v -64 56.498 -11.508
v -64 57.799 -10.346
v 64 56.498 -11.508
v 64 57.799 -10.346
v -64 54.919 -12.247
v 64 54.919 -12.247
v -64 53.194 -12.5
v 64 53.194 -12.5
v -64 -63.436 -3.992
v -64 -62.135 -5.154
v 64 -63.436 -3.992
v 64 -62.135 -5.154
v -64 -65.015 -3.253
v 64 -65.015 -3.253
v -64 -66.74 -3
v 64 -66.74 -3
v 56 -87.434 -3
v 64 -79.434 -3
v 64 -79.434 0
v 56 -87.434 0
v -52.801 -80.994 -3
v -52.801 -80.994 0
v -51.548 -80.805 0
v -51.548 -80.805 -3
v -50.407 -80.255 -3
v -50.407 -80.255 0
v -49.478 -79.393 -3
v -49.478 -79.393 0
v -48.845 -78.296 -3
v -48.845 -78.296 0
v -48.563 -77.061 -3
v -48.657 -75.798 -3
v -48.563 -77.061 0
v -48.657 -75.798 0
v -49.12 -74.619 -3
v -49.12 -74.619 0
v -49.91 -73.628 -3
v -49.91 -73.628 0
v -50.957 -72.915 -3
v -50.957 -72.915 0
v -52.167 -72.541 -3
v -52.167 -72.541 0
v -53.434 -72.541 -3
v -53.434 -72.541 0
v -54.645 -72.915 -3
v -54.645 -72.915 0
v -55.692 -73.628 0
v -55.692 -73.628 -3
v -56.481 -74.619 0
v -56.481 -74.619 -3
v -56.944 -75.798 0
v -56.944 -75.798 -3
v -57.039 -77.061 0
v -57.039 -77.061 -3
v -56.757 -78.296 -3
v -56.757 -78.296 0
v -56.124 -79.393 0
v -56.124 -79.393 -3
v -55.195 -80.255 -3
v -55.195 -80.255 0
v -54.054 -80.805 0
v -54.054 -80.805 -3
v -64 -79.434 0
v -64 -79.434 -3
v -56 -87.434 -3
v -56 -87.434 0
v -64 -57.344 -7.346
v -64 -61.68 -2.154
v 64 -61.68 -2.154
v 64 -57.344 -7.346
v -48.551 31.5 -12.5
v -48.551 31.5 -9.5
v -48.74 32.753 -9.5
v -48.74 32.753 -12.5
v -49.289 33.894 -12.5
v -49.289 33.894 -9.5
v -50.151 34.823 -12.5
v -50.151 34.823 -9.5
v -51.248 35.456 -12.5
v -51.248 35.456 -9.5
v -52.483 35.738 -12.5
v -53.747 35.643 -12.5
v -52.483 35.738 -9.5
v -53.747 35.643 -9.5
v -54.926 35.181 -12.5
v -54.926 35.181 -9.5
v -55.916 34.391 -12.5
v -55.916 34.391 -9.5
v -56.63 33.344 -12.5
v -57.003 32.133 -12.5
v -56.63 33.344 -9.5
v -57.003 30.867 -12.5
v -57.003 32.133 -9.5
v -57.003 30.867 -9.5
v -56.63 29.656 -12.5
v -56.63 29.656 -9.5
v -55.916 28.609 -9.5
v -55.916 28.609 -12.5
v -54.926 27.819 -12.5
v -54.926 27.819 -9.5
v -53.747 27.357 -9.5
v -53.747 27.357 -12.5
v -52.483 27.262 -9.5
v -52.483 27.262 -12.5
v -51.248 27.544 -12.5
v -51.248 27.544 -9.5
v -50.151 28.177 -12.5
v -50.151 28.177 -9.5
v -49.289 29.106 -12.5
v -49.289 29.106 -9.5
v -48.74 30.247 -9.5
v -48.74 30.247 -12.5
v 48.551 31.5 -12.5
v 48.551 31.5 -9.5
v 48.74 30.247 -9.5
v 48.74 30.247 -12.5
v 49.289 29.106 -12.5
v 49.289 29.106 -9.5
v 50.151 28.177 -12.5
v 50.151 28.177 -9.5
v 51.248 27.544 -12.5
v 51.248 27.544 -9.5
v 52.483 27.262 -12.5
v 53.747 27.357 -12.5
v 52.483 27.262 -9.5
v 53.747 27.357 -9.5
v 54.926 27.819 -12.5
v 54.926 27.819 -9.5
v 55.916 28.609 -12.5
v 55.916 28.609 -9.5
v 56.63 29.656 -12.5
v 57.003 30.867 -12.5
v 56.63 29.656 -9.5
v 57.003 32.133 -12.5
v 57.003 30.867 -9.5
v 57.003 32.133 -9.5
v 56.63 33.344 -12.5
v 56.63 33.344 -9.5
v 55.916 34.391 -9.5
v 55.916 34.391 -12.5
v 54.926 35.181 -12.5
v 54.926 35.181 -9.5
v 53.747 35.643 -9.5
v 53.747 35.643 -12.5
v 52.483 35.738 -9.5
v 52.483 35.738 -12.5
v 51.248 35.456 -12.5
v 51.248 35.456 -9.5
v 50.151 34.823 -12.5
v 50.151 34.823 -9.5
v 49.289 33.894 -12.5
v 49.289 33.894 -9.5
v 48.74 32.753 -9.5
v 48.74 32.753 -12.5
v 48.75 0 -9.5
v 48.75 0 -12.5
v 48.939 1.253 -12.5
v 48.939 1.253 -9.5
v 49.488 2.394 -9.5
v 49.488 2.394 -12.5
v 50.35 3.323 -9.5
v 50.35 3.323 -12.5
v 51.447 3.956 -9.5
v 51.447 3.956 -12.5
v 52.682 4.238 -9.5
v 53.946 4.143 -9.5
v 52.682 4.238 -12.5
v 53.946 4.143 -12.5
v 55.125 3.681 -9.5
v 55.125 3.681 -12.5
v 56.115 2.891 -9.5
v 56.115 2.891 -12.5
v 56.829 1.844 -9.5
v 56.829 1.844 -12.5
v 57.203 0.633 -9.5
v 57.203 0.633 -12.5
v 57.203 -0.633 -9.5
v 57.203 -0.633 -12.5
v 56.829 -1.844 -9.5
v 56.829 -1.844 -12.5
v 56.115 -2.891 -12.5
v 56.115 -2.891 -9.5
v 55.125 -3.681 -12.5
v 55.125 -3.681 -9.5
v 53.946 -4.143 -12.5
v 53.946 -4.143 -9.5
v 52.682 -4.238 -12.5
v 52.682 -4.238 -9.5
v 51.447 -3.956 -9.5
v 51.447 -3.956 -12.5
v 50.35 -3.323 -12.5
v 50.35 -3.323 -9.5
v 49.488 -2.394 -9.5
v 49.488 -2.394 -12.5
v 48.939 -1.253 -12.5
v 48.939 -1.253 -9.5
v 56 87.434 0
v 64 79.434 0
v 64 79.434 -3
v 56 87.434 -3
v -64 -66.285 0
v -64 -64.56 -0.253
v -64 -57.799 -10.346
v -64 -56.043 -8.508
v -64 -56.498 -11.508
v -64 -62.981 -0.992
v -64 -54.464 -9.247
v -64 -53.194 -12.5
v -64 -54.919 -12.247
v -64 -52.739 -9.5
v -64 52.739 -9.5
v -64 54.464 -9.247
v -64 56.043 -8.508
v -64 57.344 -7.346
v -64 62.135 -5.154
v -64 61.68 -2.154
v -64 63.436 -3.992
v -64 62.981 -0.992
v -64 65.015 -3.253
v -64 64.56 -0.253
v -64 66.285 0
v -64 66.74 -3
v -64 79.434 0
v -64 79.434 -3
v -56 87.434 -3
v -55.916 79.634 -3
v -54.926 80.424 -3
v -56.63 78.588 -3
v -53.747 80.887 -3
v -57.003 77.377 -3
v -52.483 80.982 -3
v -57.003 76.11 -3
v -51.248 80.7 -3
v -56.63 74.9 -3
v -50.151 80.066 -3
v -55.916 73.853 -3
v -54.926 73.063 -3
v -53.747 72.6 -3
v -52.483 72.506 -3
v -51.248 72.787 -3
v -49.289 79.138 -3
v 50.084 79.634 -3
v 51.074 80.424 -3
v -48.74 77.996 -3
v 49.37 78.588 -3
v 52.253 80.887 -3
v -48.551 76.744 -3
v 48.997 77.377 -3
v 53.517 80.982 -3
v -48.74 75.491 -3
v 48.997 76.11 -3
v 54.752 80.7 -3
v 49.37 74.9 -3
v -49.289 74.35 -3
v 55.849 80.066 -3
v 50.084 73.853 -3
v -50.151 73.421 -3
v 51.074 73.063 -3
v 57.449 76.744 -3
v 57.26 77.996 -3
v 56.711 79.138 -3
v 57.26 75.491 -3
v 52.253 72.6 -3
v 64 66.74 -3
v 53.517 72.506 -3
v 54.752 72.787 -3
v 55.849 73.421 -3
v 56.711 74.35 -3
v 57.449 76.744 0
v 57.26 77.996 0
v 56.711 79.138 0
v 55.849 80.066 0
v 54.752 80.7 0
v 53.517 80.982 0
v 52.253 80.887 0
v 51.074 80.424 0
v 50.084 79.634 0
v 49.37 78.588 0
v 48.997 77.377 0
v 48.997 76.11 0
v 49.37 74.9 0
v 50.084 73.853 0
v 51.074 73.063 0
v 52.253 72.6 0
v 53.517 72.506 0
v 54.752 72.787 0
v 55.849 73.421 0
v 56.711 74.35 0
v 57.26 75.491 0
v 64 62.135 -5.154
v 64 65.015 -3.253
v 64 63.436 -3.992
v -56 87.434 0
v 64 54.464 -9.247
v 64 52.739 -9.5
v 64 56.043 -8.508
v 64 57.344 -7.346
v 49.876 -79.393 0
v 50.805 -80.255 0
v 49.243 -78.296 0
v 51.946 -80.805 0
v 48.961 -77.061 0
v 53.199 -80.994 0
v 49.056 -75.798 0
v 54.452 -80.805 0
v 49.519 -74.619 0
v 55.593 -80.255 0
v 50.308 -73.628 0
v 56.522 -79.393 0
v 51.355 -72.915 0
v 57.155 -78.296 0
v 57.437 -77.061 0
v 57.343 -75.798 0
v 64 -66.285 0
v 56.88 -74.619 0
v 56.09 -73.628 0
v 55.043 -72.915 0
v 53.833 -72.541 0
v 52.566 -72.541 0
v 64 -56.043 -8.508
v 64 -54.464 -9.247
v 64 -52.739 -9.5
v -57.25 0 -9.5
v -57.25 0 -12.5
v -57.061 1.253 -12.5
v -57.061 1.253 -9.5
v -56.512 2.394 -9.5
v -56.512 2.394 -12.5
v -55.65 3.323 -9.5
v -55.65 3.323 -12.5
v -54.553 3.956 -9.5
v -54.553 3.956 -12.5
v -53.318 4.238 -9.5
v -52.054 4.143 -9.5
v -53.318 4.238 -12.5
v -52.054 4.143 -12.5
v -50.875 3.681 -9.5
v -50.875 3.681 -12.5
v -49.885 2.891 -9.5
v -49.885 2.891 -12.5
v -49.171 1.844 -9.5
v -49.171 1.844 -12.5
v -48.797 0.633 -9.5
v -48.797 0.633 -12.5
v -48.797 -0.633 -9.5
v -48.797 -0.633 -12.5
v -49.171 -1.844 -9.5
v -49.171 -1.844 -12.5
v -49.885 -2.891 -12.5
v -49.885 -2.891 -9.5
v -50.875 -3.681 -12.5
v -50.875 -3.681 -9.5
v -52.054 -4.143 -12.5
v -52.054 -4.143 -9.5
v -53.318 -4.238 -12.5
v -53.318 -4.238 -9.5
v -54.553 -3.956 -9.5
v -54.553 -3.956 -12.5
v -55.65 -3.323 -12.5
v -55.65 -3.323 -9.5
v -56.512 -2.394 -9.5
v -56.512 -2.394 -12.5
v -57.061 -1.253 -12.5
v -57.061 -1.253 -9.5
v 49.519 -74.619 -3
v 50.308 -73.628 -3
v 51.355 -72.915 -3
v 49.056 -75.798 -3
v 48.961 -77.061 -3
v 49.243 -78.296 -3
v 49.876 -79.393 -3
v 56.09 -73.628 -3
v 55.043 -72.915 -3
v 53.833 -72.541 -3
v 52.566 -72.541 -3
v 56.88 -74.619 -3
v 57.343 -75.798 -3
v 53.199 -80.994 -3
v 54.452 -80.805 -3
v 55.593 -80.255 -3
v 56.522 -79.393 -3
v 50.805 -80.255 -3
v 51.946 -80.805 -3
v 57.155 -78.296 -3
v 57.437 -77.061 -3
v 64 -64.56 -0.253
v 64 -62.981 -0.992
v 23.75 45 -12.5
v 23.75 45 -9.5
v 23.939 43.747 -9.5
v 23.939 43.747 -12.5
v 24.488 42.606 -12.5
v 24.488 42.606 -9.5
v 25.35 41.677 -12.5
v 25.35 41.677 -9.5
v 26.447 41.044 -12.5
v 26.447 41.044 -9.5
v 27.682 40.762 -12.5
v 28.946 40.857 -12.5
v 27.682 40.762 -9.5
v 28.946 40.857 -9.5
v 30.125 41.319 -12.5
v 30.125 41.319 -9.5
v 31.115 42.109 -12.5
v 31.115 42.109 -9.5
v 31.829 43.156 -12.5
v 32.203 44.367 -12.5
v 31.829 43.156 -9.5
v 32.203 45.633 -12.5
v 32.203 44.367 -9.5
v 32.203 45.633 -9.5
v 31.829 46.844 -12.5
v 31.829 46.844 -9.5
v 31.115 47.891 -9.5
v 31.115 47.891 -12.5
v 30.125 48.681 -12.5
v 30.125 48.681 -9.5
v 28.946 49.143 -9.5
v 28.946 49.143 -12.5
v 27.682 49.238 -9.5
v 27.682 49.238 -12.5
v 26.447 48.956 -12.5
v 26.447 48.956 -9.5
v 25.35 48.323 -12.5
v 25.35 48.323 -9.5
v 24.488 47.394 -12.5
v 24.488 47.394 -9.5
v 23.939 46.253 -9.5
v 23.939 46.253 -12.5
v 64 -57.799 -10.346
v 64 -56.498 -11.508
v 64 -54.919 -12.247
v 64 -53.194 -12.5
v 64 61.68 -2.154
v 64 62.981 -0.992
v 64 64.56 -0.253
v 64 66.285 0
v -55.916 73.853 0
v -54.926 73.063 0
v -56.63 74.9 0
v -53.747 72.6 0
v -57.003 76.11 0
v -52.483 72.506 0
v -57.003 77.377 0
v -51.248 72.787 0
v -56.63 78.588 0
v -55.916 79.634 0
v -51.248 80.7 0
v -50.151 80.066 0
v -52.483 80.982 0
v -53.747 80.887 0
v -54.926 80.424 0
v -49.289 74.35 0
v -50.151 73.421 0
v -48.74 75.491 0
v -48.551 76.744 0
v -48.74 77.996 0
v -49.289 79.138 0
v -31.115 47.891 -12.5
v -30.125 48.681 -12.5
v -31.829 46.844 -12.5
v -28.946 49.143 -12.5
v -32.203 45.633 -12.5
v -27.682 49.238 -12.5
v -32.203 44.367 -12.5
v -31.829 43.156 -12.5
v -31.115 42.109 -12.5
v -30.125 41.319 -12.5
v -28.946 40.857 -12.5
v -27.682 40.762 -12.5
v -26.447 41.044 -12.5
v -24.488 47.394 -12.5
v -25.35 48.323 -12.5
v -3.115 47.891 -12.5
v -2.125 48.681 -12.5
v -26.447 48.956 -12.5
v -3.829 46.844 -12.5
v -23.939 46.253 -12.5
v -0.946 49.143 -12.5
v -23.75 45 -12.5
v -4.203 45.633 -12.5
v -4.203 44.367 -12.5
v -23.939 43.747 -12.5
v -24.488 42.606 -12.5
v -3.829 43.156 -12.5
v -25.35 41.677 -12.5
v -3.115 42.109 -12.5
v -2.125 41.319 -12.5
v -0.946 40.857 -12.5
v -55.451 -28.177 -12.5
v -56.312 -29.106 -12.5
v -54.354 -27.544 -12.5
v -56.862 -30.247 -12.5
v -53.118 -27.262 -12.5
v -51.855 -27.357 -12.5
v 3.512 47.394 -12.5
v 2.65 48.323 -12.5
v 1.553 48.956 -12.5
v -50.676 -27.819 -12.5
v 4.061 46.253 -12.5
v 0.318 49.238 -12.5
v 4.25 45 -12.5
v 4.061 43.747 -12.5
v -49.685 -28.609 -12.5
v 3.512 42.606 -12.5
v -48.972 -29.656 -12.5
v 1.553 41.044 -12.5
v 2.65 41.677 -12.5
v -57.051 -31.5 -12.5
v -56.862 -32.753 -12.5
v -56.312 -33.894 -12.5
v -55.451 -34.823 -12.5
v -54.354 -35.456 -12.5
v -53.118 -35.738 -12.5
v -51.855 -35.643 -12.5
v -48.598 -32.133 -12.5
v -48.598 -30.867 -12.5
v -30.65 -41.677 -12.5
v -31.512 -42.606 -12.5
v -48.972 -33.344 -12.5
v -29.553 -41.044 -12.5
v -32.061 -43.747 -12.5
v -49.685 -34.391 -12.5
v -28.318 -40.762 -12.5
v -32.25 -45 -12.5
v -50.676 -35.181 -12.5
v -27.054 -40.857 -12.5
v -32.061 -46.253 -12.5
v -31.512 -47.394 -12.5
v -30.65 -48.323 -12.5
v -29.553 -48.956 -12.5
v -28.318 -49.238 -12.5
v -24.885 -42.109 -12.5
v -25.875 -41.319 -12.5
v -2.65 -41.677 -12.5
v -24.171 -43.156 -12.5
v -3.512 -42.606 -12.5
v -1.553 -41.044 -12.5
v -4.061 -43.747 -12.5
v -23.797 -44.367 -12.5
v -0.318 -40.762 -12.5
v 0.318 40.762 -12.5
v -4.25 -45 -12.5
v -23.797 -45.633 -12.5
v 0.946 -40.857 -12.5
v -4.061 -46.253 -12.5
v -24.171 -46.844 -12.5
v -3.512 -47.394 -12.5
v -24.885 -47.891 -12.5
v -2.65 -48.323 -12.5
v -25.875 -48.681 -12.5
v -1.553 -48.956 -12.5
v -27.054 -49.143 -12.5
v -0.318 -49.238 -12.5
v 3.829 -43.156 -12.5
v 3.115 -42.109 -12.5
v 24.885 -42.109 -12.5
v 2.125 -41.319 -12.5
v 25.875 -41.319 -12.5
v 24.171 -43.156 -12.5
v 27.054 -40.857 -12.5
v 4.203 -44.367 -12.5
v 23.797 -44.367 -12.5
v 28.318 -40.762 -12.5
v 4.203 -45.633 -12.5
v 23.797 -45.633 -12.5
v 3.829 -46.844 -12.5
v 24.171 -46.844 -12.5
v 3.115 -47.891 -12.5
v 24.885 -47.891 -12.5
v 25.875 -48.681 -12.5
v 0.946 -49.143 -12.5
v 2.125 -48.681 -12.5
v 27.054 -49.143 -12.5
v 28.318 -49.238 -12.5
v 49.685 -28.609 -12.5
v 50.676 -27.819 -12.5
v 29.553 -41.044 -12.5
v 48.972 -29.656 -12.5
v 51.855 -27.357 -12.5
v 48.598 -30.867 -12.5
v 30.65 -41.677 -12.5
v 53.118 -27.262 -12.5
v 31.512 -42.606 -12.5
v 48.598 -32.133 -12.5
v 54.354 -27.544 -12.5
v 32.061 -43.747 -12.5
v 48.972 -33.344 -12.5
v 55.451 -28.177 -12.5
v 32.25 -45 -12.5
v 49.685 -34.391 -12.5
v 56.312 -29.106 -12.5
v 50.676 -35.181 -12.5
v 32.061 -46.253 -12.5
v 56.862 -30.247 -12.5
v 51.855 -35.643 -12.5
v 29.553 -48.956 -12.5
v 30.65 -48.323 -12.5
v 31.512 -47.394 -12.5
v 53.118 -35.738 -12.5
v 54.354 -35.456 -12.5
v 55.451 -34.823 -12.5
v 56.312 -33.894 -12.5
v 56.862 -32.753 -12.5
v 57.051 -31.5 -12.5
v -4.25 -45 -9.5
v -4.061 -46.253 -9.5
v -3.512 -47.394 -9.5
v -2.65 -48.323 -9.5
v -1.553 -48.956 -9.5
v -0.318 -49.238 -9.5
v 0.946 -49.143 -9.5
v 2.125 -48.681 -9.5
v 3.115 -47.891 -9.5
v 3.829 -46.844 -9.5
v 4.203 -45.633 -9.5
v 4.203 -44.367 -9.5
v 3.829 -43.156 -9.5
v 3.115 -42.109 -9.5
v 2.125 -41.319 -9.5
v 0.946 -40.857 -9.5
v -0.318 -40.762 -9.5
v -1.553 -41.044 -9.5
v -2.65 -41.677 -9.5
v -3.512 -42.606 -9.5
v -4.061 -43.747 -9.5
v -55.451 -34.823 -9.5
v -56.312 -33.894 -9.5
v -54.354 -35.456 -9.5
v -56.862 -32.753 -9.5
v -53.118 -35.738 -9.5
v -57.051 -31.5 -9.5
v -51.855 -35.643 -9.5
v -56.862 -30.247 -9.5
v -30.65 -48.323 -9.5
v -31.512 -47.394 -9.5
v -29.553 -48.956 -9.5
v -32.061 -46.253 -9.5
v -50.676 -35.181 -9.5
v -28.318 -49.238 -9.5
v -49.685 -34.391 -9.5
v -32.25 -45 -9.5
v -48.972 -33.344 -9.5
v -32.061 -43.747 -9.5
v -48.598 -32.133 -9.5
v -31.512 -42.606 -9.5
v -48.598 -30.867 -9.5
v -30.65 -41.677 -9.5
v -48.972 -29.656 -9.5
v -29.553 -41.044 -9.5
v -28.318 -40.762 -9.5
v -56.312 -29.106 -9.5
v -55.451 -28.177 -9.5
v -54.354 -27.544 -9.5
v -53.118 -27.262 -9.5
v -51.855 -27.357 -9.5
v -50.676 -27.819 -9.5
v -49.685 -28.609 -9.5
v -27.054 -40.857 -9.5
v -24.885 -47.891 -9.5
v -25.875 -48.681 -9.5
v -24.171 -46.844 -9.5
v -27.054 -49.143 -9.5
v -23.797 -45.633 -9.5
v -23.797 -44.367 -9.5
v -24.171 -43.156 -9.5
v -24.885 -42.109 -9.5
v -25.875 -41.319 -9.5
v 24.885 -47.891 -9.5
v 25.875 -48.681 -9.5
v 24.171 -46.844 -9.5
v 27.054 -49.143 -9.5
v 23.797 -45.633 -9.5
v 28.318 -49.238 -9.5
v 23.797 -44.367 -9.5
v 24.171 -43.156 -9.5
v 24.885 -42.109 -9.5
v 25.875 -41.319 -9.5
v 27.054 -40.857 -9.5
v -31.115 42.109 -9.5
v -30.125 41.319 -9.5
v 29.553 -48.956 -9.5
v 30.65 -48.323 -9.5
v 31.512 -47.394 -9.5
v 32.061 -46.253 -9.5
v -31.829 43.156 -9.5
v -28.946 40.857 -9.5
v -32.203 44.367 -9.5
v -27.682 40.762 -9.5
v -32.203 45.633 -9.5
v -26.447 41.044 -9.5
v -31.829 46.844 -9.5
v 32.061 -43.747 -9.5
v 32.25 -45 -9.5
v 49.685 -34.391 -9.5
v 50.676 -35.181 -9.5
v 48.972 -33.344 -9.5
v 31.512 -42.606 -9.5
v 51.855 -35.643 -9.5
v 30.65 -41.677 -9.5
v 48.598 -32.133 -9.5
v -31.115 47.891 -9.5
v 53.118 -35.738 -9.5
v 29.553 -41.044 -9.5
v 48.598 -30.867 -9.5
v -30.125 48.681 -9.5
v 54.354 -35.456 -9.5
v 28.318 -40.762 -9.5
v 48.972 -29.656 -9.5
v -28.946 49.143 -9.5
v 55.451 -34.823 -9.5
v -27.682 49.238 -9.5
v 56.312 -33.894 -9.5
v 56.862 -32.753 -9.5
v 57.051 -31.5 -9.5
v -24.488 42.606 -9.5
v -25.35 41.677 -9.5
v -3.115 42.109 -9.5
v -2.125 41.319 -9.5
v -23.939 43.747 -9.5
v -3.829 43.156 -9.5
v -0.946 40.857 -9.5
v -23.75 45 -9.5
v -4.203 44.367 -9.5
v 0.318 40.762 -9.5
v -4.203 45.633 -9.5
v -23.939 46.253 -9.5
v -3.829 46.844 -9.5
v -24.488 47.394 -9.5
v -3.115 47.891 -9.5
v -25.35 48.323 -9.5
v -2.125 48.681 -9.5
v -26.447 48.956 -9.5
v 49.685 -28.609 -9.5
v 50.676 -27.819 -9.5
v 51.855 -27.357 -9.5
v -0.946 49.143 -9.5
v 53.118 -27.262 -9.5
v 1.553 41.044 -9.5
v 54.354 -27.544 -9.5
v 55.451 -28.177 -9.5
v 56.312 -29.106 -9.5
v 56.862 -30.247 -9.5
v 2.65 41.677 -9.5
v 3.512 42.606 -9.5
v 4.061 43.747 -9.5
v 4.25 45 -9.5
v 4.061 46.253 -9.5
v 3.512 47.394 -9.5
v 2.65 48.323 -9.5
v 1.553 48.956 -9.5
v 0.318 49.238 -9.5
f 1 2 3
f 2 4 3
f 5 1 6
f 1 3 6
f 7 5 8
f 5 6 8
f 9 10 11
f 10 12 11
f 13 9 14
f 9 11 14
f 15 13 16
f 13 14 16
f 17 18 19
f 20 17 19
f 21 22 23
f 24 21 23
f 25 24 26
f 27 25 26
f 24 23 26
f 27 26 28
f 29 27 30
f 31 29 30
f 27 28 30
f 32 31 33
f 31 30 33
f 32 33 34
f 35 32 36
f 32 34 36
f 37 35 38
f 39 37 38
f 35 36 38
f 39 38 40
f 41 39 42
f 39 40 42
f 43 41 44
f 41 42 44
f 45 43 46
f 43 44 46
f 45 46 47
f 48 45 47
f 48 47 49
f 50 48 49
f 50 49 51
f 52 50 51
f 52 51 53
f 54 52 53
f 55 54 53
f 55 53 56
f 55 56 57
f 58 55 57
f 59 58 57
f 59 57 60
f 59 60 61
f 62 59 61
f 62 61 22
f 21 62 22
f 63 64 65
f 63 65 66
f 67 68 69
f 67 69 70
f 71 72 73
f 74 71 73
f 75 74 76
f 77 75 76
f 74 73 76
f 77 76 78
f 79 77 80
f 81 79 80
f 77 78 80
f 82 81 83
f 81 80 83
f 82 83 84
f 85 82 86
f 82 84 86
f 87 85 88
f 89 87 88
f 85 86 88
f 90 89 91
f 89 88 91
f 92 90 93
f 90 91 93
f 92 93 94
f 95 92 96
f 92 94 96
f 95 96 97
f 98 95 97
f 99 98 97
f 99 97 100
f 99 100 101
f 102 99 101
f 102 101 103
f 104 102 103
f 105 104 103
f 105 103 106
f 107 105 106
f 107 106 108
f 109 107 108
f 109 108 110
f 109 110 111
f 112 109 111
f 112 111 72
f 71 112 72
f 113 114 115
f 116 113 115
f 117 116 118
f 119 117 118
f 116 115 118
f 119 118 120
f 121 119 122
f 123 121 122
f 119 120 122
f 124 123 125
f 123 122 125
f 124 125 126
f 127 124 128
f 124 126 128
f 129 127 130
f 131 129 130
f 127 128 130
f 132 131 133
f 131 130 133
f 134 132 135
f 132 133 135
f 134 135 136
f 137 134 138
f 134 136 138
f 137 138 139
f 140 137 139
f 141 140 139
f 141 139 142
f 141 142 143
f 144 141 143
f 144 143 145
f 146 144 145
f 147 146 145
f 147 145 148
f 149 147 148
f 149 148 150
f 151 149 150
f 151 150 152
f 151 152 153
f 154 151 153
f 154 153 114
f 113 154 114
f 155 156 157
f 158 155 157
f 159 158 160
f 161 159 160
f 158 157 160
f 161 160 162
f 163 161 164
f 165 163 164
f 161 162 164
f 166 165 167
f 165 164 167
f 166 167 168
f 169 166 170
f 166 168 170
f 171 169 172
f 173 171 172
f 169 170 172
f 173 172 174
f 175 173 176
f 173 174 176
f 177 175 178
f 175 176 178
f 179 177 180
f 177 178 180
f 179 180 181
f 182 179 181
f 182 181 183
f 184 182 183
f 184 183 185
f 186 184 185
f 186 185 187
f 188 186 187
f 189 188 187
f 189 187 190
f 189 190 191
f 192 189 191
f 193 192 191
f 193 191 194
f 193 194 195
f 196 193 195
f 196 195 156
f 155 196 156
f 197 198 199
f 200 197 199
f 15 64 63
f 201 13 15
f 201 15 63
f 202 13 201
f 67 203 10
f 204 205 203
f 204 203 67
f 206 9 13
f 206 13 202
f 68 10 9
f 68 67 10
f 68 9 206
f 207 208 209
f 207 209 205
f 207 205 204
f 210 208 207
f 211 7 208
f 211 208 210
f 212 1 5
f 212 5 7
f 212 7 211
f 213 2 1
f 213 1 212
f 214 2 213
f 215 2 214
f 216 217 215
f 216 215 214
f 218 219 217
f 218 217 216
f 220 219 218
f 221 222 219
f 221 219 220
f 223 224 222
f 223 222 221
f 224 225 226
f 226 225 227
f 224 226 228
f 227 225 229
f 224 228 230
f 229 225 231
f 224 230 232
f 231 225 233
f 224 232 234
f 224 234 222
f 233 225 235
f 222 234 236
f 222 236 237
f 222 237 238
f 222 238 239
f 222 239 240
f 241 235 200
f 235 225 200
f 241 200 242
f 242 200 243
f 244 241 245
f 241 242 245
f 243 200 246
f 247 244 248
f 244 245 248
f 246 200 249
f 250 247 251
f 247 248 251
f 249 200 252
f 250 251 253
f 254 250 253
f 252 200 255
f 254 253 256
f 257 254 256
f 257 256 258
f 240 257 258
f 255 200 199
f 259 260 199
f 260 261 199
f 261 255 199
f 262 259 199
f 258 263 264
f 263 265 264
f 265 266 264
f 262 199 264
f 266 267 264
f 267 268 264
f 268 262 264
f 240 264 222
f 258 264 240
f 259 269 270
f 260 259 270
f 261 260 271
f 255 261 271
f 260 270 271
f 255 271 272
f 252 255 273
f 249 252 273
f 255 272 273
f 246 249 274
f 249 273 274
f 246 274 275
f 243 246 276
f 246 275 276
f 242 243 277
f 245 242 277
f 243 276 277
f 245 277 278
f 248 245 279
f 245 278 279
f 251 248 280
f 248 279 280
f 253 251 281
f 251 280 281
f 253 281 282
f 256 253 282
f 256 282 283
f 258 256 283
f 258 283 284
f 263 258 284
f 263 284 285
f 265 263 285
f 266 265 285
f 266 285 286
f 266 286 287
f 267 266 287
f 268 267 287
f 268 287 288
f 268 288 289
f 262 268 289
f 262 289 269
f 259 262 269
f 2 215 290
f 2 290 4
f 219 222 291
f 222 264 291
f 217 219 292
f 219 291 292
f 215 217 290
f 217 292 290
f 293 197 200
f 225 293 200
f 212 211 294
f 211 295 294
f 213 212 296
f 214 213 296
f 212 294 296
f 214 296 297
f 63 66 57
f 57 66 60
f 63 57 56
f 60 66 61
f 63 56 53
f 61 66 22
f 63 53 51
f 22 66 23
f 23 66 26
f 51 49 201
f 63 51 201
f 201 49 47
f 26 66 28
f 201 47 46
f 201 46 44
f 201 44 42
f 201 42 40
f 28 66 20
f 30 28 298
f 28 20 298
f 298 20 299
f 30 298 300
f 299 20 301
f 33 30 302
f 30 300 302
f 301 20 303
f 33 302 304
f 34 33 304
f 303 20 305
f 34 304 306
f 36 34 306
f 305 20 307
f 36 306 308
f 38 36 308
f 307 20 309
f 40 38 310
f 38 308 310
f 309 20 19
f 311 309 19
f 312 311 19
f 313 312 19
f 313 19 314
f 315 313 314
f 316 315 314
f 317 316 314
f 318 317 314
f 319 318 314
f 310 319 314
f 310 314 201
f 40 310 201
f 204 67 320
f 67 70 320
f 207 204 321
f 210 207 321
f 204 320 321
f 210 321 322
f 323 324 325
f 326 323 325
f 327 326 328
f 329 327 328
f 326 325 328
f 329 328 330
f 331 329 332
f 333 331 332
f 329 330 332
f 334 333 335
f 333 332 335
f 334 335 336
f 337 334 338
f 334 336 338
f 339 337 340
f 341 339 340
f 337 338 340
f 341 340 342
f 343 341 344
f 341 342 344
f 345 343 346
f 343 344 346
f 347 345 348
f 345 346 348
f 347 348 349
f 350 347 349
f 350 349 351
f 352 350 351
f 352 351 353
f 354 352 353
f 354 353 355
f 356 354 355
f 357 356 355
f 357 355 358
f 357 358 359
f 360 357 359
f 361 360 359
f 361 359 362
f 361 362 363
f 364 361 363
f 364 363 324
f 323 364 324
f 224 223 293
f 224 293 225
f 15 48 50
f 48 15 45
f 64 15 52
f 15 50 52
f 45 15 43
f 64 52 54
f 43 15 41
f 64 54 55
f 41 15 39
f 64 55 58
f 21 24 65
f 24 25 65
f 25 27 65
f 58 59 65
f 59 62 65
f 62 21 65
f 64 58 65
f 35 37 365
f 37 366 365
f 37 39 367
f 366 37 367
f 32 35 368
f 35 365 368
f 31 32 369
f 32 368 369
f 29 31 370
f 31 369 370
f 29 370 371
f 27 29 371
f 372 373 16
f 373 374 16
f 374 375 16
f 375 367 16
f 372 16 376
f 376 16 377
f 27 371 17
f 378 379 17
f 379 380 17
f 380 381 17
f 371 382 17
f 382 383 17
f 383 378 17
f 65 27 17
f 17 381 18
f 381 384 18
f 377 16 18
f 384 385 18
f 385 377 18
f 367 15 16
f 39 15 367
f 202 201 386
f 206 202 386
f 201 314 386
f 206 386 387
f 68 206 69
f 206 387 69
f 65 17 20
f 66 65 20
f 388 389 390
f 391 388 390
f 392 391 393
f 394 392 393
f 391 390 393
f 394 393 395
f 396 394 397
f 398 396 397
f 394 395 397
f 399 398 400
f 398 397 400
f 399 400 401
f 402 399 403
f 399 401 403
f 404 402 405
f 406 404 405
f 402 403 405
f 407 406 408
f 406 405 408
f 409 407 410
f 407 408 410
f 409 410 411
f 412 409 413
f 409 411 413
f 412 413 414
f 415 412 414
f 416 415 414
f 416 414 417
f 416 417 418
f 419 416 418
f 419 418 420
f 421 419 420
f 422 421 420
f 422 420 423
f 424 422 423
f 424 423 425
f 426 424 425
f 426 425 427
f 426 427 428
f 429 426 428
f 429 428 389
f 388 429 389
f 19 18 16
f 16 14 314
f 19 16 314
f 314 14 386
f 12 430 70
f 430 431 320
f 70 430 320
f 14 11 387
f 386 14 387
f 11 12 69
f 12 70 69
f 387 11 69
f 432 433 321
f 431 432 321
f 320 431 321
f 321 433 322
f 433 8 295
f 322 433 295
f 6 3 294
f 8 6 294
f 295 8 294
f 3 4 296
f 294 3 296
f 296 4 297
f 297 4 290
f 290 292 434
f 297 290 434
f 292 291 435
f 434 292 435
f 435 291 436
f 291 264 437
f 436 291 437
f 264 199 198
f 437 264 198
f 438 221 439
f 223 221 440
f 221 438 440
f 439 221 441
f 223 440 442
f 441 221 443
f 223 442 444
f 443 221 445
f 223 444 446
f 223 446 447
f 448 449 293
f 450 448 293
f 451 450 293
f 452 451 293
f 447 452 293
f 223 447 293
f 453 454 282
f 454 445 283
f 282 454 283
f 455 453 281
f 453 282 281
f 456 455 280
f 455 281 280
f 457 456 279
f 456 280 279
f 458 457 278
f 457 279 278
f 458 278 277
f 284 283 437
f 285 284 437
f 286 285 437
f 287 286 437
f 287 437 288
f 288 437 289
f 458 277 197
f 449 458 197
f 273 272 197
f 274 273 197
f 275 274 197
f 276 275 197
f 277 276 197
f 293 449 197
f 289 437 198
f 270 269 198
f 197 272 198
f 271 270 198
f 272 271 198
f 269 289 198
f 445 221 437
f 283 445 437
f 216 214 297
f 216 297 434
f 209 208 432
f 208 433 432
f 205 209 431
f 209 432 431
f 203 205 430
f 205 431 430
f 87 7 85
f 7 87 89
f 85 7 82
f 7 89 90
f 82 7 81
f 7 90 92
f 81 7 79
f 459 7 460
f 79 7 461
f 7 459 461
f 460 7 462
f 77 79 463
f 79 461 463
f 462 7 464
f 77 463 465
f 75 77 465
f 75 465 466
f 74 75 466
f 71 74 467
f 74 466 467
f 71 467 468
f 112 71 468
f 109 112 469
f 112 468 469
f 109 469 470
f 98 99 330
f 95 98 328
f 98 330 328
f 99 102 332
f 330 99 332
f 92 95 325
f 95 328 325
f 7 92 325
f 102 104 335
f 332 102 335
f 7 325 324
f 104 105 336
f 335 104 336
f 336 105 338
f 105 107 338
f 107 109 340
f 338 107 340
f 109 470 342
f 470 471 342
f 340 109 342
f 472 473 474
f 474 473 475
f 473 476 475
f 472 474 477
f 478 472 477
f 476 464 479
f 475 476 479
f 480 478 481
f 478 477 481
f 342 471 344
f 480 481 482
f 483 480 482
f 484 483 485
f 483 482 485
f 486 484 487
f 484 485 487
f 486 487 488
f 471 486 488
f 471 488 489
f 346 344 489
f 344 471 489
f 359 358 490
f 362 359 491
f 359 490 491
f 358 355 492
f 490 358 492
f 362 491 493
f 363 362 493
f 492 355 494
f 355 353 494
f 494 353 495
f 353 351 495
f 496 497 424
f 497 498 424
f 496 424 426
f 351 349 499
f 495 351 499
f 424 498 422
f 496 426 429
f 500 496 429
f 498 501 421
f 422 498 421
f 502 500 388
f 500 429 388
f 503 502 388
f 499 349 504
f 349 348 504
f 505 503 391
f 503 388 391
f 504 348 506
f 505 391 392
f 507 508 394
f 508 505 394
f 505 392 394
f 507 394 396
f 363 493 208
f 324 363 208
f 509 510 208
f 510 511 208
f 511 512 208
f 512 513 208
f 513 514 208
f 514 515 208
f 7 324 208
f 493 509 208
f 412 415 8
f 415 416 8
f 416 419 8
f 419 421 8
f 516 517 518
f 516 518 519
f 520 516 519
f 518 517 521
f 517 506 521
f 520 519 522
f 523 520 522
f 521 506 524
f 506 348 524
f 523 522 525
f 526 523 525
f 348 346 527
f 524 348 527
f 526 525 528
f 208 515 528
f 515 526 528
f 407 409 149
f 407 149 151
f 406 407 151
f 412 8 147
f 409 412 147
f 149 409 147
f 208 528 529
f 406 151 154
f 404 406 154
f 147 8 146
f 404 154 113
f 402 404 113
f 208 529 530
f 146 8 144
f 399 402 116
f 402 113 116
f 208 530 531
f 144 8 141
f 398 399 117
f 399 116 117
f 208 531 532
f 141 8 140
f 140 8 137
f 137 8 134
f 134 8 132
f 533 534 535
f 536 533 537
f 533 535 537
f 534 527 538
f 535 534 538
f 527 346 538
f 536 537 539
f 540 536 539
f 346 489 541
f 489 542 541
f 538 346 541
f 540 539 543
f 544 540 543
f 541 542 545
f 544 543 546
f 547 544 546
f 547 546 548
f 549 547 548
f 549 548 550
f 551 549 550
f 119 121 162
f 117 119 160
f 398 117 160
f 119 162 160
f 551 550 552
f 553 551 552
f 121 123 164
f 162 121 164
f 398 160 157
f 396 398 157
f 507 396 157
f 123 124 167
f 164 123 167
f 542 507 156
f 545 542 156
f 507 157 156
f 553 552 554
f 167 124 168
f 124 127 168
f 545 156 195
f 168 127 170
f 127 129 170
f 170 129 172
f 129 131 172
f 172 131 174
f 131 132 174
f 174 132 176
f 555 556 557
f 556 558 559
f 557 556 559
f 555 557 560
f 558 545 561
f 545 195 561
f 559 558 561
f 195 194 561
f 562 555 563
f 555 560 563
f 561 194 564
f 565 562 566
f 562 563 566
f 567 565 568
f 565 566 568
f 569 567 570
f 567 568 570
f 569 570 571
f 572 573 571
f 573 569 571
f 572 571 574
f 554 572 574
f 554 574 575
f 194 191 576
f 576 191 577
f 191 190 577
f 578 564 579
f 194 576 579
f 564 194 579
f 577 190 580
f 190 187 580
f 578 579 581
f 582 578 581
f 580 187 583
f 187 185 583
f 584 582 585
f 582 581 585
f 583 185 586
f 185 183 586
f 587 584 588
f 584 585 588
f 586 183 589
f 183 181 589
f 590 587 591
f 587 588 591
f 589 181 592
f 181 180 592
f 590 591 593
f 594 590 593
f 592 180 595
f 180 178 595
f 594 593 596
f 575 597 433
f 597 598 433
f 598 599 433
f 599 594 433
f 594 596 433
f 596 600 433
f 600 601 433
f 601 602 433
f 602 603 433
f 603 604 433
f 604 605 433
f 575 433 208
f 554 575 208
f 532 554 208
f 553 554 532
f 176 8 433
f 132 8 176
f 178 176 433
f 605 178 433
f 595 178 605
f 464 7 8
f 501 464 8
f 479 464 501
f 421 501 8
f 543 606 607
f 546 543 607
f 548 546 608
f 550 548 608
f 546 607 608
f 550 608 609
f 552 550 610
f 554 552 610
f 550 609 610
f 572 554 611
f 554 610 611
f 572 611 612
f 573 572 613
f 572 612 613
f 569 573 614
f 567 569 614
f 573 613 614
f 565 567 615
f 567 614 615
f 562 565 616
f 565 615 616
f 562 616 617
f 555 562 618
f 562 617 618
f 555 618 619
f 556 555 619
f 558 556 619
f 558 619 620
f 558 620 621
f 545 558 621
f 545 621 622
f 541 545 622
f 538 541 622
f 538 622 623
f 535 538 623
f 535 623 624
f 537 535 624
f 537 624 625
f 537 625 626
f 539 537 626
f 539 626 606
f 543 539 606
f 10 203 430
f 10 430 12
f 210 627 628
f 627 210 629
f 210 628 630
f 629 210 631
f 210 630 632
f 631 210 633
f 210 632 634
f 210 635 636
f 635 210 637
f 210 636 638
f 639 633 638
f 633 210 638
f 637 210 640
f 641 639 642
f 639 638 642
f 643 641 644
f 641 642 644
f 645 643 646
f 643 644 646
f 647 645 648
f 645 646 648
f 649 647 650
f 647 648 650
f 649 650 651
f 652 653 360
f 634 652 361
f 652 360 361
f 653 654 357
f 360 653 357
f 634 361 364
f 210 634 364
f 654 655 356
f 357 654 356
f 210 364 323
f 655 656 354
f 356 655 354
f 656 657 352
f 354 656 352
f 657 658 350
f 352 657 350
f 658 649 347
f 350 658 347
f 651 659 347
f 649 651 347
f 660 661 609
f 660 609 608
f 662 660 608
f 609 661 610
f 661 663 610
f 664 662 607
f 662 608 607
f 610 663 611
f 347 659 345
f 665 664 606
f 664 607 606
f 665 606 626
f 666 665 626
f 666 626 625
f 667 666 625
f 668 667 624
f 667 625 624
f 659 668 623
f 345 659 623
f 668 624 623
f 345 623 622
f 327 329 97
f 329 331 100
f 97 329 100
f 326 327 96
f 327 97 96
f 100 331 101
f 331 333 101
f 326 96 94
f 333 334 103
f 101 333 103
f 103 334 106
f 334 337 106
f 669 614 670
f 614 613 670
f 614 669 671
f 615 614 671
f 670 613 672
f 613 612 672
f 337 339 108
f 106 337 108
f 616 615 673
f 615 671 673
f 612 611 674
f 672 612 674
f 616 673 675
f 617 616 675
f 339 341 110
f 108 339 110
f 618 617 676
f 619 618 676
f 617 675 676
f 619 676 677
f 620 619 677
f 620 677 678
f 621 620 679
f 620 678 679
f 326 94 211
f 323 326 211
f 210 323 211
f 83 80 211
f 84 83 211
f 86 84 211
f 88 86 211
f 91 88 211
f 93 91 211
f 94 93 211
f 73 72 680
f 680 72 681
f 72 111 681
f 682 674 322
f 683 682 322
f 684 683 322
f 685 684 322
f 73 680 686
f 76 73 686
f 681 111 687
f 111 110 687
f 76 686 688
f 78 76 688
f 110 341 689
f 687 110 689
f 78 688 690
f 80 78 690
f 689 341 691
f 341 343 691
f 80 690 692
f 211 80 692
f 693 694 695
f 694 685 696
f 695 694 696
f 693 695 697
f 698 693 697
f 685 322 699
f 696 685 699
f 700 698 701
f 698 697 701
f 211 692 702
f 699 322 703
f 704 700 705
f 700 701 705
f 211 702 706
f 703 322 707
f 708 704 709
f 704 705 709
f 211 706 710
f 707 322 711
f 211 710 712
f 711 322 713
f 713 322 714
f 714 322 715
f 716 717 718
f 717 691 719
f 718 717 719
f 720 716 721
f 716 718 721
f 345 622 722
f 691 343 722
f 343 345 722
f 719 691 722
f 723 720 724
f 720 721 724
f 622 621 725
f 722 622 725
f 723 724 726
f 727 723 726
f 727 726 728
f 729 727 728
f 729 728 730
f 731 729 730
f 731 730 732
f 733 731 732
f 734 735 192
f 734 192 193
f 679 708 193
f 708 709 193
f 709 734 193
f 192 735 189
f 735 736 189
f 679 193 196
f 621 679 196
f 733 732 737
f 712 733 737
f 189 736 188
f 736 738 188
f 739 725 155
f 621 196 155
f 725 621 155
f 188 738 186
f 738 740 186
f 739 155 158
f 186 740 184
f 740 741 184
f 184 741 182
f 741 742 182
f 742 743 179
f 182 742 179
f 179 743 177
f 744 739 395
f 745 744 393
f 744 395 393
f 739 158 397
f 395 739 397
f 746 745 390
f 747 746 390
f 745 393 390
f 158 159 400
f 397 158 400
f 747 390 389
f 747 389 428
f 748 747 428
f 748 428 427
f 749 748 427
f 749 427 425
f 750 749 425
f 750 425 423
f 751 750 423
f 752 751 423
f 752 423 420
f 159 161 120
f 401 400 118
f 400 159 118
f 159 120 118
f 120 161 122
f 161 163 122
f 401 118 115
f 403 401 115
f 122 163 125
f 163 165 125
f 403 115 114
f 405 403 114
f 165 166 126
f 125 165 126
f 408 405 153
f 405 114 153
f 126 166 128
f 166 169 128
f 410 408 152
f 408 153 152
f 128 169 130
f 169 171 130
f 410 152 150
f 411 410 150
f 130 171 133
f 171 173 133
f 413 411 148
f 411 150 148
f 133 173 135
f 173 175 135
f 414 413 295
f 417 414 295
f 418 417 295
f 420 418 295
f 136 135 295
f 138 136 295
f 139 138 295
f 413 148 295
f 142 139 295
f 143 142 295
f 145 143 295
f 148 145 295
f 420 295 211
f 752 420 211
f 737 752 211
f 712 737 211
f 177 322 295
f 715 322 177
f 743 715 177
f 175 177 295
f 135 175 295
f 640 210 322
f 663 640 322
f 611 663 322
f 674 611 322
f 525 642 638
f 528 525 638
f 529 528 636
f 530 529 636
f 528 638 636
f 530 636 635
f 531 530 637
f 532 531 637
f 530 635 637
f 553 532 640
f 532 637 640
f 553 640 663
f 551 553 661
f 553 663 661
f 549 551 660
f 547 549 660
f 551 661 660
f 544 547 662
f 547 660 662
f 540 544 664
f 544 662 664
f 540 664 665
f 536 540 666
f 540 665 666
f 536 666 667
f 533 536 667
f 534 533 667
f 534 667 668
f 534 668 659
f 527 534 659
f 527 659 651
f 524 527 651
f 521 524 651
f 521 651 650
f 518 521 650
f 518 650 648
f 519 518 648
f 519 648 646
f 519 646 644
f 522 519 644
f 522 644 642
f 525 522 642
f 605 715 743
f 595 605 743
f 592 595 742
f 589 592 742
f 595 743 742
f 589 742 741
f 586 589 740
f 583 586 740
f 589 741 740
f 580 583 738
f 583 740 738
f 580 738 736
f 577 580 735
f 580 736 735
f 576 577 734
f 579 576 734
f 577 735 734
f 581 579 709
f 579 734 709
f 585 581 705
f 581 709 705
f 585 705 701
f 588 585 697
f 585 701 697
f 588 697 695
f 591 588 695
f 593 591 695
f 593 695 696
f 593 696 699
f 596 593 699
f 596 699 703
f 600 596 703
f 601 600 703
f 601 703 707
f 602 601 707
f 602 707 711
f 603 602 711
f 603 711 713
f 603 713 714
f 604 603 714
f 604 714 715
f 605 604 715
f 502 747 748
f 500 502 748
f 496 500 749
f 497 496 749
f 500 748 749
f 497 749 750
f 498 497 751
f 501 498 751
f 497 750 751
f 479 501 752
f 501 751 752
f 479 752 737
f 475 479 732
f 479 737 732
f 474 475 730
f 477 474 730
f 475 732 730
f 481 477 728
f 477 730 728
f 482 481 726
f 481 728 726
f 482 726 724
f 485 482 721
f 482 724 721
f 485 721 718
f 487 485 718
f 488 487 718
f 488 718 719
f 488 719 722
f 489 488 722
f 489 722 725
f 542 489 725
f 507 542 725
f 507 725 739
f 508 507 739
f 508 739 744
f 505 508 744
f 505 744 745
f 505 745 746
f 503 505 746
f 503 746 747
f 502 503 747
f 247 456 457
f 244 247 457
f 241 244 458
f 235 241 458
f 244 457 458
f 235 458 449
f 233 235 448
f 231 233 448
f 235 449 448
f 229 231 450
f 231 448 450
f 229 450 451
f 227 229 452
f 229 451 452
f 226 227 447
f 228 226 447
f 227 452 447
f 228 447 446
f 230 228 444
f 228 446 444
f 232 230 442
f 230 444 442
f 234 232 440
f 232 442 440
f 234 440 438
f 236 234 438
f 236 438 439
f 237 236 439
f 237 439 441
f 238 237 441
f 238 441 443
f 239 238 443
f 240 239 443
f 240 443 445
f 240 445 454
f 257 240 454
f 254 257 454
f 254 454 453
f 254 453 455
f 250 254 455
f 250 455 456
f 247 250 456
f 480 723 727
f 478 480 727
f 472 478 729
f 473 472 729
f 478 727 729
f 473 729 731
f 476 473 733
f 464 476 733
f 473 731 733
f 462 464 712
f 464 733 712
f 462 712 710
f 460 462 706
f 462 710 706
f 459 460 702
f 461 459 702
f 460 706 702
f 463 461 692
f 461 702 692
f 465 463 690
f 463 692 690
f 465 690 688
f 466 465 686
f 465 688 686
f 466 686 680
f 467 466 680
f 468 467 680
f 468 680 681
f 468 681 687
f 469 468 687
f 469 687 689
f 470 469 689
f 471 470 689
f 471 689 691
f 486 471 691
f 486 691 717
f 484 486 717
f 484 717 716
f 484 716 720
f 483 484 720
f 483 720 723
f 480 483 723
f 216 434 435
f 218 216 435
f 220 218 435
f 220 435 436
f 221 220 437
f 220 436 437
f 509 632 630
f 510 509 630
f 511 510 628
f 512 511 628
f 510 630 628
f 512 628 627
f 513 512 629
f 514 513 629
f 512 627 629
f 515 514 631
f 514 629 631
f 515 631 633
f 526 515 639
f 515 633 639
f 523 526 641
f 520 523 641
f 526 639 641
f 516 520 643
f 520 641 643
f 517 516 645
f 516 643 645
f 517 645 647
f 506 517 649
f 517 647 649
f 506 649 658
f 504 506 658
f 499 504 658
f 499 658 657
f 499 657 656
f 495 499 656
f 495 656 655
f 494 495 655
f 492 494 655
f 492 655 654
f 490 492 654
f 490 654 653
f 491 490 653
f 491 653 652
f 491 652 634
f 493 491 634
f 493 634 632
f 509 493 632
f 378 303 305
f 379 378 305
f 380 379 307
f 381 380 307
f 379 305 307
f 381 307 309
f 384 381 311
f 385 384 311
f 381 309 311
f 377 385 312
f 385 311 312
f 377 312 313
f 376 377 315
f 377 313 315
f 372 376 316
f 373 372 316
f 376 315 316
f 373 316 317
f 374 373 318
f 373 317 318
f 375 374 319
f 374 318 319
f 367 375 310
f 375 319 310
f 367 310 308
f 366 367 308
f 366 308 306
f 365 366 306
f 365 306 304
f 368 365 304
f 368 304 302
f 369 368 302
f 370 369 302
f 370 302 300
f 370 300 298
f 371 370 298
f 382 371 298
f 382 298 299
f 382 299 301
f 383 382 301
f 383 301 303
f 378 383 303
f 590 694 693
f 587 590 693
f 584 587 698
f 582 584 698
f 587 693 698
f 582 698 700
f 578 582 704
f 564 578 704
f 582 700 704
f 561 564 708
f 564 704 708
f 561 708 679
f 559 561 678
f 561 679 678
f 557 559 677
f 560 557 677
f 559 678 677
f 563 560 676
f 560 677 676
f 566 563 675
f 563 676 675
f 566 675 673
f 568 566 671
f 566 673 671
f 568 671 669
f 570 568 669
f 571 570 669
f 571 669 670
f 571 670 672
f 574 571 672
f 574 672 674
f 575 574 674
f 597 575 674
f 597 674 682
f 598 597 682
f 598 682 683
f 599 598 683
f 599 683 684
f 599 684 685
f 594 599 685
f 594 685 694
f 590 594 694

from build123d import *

# Parameters (mm, degrees)
EXTRUDE_1_DEPTH     = 64
CHAMFER_1_SIZE      = 8
SKETCH_4_R          = 4.25
CUT_EXTRUDE_1_DEPTH = 110.073337851
SKETCH_6_R          = 4.25
CUT_EXTRUDE_2_DEPTH = 10


with BuildPart() as part:
    # 草图1 → 凸台-拉伸1 (new, symmetric)
    with BuildSketch(Plane(origin=(0, 0, 0), x_dir=(0, 0, -1), z_dir=(1, 0, 0))):
        with BuildLine():
            Line((0, 87.434221161), (3, 87.434221161))
            Line((3, 87.434221161), (3, 66.740486184))
            ThreePointArc((3, 66.740486184), (3.565077878, 64.198514208), (5.153873841, 62.135346276))
            Line((5.153873841, 62.135346276), (10.346126159, 57.798874885))
            ThreePointArc((10.346126159, 57.798874885), (11.934922122, 55.735706953), (12.5, 53.193734977))
            Line((12.5, 53.193734977), (12.5, -53.193734977))
            ThreePointArc((12.5, -53.193734977), (11.934922122, -55.735706953), (10.346126159, -57.798874885))
            Line((10.346126159, -57.798874885), (5.153873841, -62.135346276))
            ThreePointArc((5.153873841, -62.135346276), (3.565077878, -64.198514208), (3, -66.740486184))
            Line((3, -66.740486184), (3, -87.434221161))
            Line((3, -87.434221161), (0, -87.434221161))
            Line((0, -87.434221161), (0, -66.285275099))
            ThreePointArc((0, -66.285275099), (0.565077878, -63.743303123), (2.153873841, -61.680135191))
            Line((2.153873841, -61.680135191), (7.346126159, -57.3436638))
            ThreePointArc((7.346126159, -57.3436638), (8.934922122, -55.280495868), (9.5, -52.738523893))
            Line((9.5, -52.738523893), (9.5, 52.738523893))
            ThreePointArc((9.5, 52.738523893), (8.934922122, 55.280495868), (7.346126159, 57.3436638))
            Line((7.346126159, 57.3436638), (2.153873841, 61.680135191))
            ThreePointArc((2.153873841, 61.680135191), (0.565077878, 63.743303123), (0, 66.285275099))
            Line((0, 66.285275099), (0, 87.434221161))
        make_face()
    extrude(amount=EXTRUDE_1_DEPTH, both=True)

    # 倒角1
    chamfer_1_edges = [part.edges().sort_by_distance(p)[0] for p in [
        (-64, 87.434221161, -1.5),
        (-64, -87.434221161, -1.5),
        (64, -87.434221161, -1.5),
        (64, 87.434221161, -1.5),
    ]]
    chamfer(chamfer_1_edges, length=CHAMFER_1_SIZE)

    # 草图4 → 切除-拉伸1 (cut, through all)
    with BuildSketch(Plane.XY):
        with Locations((-52.800881805, 76.743624005)):
            Circle(SKETCH_4_R)
        with Locations((53.199118195, 76.743624005)):
            Circle(SKETCH_4_R)
        with Locations((-52.800881805, 31.5)):
            Circle(SKETCH_4_R)
        with Locations((-28, 45)):
            Circle(SKETCH_4_R)
        with Locations((0, 45)):
            Circle(SKETCH_4_R)
        with Locations(Location((52.800881805, 31.5, 0), (0, 0, 180))):
            Circle(SKETCH_4_R)
        with Locations(Location((28, 45, 0), (0, 0, 180))):
            Circle(SKETCH_4_R)
        with Locations(Location((53.199118195, -76.743624005, 0), (0, 0, 270))):
            Circle(SKETCH_4_R)
        with Locations((52.800881805, -31.5)):
            Circle(SKETCH_4_R)
        with Locations((28, -45)):
            Circle(SKETCH_4_R)
        with Locations(Location((0, -45, 0), (0, 0, 180))):
            Circle(SKETCH_4_R)
        with Locations(Location((-28, -45, 0), (0, 0, 180))):
            Circle(SKETCH_4_R)
        with Locations(Location((-52.800881805, -31.5, 0), (0, 0, 180))):
            Circle(SKETCH_4_R)
        with Locations(Location((-52.800881805, -76.743624005, 0), (0, 0, 270))):
            Circle(SKETCH_4_R)
    extrude(amount=-CUT_EXTRUDE_1_DEPTH, mode=Mode.SUBTRACT)

    # 草图6 → 切除-拉伸2 (cut)
    with BuildSketch(Plane(origin=(0, 0, -12.5), x_dir=(-1, 0, 0), z_dir=(0, 0, -1))):
        with Locations((-53, 0)):
            Circle(SKETCH_6_R)
        with Locations((53, 0)):
            Circle(SKETCH_6_R)
    extrude(amount=-CUT_EXTRUDE_2_DEPTH, mode=Mode.SUBTRACT)


solid = part.part
